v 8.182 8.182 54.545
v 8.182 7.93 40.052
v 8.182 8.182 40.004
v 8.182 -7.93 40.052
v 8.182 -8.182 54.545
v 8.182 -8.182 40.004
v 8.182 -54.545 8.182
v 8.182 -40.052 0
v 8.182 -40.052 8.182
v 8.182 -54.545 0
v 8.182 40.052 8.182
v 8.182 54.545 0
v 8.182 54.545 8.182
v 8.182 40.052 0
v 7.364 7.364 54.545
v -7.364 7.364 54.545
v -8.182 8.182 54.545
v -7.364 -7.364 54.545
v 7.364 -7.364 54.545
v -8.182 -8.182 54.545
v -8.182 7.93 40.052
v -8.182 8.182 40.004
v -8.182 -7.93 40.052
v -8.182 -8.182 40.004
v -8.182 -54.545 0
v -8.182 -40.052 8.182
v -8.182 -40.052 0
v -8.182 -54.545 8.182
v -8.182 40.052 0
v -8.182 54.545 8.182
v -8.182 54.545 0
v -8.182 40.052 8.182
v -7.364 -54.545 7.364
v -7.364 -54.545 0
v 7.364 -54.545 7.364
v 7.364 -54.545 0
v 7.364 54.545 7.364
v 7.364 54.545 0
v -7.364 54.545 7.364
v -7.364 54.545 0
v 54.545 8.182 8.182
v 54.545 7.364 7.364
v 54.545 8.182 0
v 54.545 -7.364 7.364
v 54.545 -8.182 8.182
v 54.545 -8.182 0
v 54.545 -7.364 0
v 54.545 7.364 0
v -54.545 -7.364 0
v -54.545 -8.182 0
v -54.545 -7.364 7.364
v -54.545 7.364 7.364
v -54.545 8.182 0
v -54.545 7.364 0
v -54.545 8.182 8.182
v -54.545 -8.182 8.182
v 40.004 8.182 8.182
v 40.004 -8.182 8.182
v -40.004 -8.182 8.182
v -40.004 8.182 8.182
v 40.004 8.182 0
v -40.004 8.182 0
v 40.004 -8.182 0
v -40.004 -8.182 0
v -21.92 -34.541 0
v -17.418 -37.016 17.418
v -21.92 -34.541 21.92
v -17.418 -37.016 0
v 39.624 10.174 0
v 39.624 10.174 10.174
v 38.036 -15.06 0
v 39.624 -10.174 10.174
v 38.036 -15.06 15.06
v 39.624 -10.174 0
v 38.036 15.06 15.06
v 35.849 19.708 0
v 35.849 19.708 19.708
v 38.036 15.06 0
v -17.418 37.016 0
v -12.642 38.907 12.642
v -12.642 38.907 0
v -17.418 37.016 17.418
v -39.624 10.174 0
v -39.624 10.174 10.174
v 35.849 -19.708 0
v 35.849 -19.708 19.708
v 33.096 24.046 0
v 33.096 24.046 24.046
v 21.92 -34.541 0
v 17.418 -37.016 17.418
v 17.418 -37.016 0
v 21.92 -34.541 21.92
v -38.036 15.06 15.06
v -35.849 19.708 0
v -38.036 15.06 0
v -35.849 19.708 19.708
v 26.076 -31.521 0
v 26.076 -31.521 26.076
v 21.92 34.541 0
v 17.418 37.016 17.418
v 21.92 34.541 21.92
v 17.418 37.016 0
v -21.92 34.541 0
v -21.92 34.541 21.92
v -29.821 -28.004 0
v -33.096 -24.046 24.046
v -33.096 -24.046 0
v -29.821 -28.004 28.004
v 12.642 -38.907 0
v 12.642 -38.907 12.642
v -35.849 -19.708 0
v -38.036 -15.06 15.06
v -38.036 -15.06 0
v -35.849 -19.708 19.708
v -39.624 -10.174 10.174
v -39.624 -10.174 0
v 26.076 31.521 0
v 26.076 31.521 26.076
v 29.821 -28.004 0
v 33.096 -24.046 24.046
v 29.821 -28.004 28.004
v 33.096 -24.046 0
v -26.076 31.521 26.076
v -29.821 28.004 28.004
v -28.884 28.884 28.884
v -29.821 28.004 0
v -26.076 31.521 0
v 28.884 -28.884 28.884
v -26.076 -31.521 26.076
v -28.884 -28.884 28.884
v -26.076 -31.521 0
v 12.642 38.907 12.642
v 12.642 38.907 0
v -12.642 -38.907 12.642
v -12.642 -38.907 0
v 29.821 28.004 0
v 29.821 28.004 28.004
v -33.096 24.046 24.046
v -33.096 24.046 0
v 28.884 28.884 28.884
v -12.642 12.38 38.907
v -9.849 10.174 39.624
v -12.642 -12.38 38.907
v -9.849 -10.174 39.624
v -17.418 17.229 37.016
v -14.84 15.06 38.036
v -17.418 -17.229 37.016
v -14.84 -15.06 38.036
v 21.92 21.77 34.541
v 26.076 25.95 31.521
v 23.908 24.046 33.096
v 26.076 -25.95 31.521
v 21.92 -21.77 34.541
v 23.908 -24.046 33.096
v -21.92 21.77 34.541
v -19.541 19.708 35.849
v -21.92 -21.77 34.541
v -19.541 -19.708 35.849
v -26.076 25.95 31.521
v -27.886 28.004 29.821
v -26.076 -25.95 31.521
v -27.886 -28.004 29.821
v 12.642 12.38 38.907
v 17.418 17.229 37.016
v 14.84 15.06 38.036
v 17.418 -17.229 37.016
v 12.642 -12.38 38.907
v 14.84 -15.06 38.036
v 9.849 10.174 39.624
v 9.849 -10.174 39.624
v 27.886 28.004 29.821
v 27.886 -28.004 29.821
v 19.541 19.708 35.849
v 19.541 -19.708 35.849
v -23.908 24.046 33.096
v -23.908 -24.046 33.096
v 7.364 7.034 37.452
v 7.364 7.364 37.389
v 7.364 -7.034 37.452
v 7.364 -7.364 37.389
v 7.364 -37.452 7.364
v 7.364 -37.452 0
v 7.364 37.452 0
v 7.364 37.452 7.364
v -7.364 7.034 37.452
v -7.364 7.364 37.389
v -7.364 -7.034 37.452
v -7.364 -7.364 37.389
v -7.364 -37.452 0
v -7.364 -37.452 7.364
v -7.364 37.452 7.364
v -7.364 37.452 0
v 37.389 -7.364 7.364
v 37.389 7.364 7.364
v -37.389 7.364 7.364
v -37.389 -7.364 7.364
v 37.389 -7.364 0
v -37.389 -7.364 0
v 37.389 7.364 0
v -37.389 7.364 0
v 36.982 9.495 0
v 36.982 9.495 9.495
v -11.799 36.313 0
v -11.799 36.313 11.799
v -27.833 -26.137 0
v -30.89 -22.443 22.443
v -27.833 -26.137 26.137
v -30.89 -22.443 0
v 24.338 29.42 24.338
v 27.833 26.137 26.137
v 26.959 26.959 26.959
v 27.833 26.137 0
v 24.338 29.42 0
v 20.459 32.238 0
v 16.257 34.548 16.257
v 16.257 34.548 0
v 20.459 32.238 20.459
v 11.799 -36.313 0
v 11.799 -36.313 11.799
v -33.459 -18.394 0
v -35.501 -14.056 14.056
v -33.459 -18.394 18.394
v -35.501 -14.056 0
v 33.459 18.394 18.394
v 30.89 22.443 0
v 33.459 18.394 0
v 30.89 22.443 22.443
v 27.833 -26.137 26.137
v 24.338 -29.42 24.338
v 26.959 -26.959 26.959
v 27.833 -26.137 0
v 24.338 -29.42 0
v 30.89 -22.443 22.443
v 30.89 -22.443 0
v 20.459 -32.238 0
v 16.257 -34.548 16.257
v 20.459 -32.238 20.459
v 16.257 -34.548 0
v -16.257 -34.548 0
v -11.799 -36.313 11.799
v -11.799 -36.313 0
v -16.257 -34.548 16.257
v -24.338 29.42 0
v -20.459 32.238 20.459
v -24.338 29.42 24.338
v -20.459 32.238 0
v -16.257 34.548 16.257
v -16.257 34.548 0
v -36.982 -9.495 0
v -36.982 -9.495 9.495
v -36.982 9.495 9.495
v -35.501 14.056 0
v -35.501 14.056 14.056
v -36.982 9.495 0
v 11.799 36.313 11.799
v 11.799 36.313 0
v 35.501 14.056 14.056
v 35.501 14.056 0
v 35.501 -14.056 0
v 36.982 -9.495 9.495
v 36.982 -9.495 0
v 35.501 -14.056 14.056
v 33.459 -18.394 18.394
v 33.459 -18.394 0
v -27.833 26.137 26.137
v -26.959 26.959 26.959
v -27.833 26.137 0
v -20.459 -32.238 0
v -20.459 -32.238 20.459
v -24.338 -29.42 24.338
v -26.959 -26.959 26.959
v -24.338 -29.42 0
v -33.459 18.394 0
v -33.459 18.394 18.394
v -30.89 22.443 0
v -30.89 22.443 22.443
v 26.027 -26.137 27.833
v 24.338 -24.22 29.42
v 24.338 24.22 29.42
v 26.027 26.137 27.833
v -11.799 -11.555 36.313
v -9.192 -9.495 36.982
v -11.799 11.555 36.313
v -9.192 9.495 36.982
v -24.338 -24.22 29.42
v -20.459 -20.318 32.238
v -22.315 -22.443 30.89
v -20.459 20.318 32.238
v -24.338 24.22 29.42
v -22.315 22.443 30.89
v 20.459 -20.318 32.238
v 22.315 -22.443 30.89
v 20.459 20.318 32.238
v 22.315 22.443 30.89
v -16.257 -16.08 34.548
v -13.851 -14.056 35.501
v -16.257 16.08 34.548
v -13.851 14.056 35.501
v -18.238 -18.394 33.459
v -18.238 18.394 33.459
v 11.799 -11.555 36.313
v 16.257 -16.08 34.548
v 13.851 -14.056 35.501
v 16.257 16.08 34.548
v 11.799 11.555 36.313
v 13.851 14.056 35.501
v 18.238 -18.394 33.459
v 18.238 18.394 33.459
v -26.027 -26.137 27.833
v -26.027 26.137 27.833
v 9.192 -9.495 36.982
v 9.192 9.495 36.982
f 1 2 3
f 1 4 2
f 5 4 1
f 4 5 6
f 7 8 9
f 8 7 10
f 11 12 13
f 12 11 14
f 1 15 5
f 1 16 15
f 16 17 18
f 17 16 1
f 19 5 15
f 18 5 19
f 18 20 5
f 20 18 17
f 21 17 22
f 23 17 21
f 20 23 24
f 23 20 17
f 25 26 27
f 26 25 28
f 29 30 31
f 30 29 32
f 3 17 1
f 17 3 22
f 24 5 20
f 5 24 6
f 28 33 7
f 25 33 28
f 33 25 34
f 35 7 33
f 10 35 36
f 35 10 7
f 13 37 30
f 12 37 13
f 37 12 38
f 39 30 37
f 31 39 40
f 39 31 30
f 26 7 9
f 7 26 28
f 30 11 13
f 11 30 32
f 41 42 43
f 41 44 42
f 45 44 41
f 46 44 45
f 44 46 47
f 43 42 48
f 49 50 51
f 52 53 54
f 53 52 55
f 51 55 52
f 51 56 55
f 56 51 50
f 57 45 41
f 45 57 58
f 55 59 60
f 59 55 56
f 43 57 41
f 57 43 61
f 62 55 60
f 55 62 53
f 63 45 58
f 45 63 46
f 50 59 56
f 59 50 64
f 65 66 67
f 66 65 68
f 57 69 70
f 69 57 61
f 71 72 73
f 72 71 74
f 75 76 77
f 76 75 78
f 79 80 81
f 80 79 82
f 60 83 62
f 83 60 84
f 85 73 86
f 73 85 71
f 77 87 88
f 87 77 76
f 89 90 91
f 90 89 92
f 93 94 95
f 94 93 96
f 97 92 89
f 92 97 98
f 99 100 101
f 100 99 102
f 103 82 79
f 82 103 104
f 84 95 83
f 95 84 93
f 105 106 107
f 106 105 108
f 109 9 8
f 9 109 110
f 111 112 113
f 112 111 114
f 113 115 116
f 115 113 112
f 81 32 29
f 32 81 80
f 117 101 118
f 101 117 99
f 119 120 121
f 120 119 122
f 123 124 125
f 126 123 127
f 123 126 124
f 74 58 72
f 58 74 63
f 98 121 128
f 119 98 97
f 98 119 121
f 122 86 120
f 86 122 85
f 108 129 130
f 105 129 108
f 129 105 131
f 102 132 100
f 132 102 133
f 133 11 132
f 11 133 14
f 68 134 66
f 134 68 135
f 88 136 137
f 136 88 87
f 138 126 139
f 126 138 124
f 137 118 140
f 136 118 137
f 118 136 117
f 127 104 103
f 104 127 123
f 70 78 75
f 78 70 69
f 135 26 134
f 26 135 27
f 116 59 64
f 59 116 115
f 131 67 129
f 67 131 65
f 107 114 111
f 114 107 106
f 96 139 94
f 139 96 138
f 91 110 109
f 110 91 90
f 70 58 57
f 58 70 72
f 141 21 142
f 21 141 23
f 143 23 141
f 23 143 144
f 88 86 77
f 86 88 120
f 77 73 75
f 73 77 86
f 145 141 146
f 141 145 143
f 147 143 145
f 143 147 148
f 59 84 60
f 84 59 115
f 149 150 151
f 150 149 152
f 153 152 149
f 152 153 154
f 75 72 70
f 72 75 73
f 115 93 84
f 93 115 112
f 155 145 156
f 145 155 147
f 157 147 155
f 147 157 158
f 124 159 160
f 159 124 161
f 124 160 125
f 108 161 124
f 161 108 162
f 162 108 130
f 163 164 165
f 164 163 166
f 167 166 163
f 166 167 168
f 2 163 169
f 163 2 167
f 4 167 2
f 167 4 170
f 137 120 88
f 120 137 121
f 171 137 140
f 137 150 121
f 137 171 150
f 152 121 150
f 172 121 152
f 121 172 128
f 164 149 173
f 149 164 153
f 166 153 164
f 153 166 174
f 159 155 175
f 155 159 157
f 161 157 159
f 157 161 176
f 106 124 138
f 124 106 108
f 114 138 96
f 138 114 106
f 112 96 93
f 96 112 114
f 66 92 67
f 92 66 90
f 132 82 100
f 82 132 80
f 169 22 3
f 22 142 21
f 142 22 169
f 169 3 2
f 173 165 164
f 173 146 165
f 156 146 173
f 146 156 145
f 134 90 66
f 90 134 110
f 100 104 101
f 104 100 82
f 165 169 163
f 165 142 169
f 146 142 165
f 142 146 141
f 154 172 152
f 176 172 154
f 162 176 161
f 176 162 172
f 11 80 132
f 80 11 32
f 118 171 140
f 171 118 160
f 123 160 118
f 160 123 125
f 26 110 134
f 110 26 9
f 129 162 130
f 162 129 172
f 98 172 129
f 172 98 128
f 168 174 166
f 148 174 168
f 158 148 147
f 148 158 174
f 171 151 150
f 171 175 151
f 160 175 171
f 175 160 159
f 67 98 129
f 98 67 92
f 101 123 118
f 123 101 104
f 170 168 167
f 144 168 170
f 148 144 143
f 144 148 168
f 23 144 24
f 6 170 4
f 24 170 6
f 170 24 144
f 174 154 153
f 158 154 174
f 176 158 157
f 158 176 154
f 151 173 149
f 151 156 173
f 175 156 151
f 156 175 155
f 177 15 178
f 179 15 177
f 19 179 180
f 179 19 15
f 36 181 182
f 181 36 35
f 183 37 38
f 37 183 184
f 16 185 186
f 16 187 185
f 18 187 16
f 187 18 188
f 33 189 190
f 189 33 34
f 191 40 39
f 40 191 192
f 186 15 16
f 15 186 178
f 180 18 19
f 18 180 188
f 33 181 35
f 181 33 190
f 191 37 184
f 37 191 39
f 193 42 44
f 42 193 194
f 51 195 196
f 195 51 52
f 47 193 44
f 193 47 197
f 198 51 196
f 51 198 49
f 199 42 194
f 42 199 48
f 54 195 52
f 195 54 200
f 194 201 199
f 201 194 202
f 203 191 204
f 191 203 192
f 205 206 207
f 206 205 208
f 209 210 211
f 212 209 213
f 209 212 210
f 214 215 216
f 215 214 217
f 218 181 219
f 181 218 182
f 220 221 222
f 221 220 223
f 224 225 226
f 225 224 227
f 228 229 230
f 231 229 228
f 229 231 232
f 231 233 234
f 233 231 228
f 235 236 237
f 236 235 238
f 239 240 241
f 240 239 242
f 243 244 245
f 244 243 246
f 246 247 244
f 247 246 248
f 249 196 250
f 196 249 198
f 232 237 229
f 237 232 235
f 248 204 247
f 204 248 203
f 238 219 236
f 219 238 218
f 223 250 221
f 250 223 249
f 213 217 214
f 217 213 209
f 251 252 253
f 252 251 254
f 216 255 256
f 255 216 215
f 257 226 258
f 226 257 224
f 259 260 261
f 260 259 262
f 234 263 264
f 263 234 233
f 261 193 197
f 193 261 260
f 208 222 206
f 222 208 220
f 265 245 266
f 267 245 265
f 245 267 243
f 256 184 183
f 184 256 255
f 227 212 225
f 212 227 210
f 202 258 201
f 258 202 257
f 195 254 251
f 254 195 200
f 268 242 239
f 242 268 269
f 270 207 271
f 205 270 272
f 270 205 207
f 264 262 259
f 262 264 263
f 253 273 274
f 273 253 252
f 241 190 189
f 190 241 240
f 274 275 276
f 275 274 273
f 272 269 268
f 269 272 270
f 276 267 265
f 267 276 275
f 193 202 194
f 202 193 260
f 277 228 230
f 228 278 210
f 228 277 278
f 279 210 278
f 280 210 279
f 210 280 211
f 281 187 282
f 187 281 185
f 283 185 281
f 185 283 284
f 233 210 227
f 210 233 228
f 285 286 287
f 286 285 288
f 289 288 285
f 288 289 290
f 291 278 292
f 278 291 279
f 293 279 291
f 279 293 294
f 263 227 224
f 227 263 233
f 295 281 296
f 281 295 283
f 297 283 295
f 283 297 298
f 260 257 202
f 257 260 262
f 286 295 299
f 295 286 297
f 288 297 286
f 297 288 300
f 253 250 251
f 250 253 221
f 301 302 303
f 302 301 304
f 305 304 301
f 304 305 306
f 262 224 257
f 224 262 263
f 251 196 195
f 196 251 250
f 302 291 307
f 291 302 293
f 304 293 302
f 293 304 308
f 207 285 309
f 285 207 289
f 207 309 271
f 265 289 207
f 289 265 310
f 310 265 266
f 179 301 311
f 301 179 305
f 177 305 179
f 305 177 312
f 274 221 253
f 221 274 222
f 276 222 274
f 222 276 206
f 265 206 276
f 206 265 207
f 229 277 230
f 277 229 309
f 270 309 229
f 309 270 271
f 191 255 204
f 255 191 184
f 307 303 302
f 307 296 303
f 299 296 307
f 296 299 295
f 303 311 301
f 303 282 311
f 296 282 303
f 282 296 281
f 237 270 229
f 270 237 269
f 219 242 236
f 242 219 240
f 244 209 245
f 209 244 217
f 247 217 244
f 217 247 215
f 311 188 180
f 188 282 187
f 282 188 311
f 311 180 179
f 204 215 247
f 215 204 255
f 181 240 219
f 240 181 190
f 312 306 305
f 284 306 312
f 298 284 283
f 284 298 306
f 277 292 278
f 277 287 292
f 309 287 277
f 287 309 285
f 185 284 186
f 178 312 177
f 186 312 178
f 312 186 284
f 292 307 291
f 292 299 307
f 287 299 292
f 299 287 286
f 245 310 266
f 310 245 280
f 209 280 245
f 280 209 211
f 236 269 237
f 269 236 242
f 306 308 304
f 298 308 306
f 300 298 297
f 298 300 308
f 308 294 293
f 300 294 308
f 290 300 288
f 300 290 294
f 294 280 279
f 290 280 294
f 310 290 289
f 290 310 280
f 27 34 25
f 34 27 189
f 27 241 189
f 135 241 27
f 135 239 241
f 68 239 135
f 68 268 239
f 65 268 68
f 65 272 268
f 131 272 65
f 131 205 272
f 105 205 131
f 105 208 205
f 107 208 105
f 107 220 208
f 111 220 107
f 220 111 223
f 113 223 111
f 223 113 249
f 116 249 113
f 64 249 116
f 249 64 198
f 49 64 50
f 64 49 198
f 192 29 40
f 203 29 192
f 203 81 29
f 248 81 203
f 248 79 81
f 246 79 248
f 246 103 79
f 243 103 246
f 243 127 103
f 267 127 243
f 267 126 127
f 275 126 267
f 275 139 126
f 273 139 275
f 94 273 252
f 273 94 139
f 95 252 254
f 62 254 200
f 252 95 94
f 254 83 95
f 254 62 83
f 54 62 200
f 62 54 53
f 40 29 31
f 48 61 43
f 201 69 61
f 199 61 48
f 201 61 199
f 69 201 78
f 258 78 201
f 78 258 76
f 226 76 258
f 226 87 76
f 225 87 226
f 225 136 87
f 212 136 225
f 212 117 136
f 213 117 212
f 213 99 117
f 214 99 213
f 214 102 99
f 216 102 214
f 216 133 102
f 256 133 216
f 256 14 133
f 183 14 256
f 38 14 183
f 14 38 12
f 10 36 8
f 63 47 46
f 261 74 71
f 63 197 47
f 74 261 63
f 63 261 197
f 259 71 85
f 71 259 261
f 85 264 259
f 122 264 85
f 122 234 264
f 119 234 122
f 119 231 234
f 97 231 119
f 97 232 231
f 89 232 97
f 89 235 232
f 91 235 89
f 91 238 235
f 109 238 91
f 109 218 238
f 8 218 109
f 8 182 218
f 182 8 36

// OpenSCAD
$fn=50;

scale_factor = 300/55;

CUBIE=18.9*scale_factor; //total side length of each cube piece (including rounded edges)
CORE=18*scale_factor;
SCREW_TIP=1.5*scale_factor;
SCREW_BODY=2*scale_factor;
SCREW_HEAD=3.8*scale_factor;
INNER=4.5*scale_factor;
SPRING=3.2*scale_factor;
ROUND=2*scale_factor; //radius of rounded edges
DEPTH=6*scale_factor;
RAFT=5*scale_factor;
LAYER=0.3*scale_factor;
GAP=0.25*scale_factor;

core_height = 20 * scale_factor;
core_radius = 3 * scale_factor;


WITH_SUPPORT=false;
WITH_RAFT=false;

inner_cubie=(CUBIE-2*ROUND); //length of each cube before rounded edges

tile_length = inner_cubie*0.75;
tile_height = 1 * scale_factor;

module tile(length, height) {
	translate([-length/2,-length/2,0]) {
		minkowski(){
			translate([0,0,-height/2]) cube([length,length,height]);
			cylinder(r=ROUND,h=height,center=true);
		}
	}
	
}


module cubie() {
    translate([-inner_cubie/2,-inner_cubie/2, -inner_cubie/2])
    minkowski() {
        cube([inner_cubie, inner_cubie, inner_cubie]);
        sphere(r=ROUND, $fn=10);
    }
}

module disc() {
    cylinder(CUBIE, r1=CORE, r2=CORE, $fn=50, center=true);

}

module disc2() {
    cylinder(CUBIE*10, r1=CORE, r2=CORE, $fn=50, center=true);

}

module icore() {
    disc();
    rotate([0,90,0])
        disc();
    rotate([90,0,0])
        disc();
}

module core2() {
    intersection() {
        disc2();
        rotate([0,90,0])
            disc2();
        rotate([90,0,0])
            disc2();
    }
}

module screw() {
    translate([5.2,0,0])
    rotate([0,90,0]) {
        cylinder(11.7,r1=SCREW_BODY,r2=SCREW_BODY,$fn=10,center=true);
        translate([0,0,-11.7/2-1.7/2])
            cylinder(1.7,r1=SCREW_HEAD,r2=SCREW_HEAD,$fn=10,center=true);
        translate([0,0,11.7/2+5.7/2])
            cylinder(5.7,r1=SCREW_TIP,r2=SCREW_TIP,$fn=10,center=true);
    }
}


module center() 
{
	difference() {
    	difference() 
	    {
	        union() 
	        {
	            difference() 
	            {
	                cubie();
	                translate([CUBIE,0,0])
	                    icore();
	
	            }
	            rotate([0,90,0])
	                cylinder(CUBIE,r1=INNER,r2=INNER,center=true);
	            if (WITH_RAFT)
	                raft();
	        }
	
	        rotate([0,90,0]) 
	        {
	            union() 
	            {
	                cylinder(CUBIE,r1=SCREW_BODY+GAP,r2=SCREW_BODY+GAP,$fn=10,center=true);
	
	                translate([0,0,CUBIE/2-1/2-3])
	                    cylinder(1.5,r1=SPRING+GAP,r2=SCREW_BODY+GAP,$fn=10,center=true);
	
	
	                translate([0,0,CUBIE/2-1/2-9.5])
	                    cylinder(1,r1=SCREW_HEAD+GAP,r2=SPRING+GAP,$fn=10,center=true);
	
	
	                translate([0,0,-4.25/2])
	                    cylinder(CUBIE-4.25,r1=SPRING+GAP,r2=SPRING+GAP,$fn=10,center=true);
	
	                translate([0,0,-10.5/2])
	                    cylinder(CUBIE-10.5,r1=SCREW_HEAD+GAP,r2=SCREW_HEAD+GAP,$fn=10,center=true); 
	            }
	        }
	    }
		translate([-CUBIE/2 + tile_height/2,0])
		rotate(v=[0,1,0], a=90)
		tile(tile_length*1.05, tile_height);		
	}
}

module edge() {
	difference() {
		difference() {
	    	union() {
		        difference() {
		            cubie();
		            translate([CUBIE,CUBIE,0])
		                icore();
		        }
		          
		
		       intersection() {
		            cube([CUBIE+(CUBIE-2*INNER),CUBIE+(CUBIE-2*INNER),2*INNER],center=true);
		            cube([50*scale_factor,50*scale_factor,2*INNER],center=true);
		            translate([CUBIE,CUBIE,0])
		            icore();
		   	}
			}
			translate([-CUBIE/2 + tile_height/2,0,0])
			rotate(v=[0,1,0],a=90)
			tile(tile_length*1.05,tile_height);
		}
		translate([0,-CUBIE/2 + tile_height/2,0])
		rotate(v=[1,0,0],a=90)
		tile(tile_length*1.05,tile_height);
	}
	
	if (WITH_RAFT)
	    raft();
   if (WITH_SUPPORT)
	    edge_support();
}

module corner() {
	difference() {
		difference() {
			difference() {
    			union() {
			        difference() {
			            cubie();
			        }
			 
			        intersection() {
			            cube([CUBIE+(CUBIE-2*INNER),CUBIE+(CUBIE-2*INNER),CUBIE+(CUBIE-2*INNER)],center=true);
			            translate([CUBIE,CUBIE,-CUBIE])
			                core2();
			        }
			   }
				translate([0,-CUBIE/2 + tile_height/2,0])
				rotate(v=[1,0,0],a=90)
				tile(tile_length*1.05,tile_height);
			}
			translate([-CUBIE/2 + tile_height/2,0,0])
			rotate(v=[0,1,0],a=90)
			tile(tile_length*1.05,tile_height);
		}
		translate([0,0,CUBIE/2 - tile_height/2])
		tile(tile_length*1.05,tile_height);
	}
			
	if (WITH_RAFT)
   raft();
   if (WITH_SUPPORT)
   corner_support();

}

module cylinder_sphere(height) {
	intersection() {
		cylinder(h=height, r=height/2, center=true);
		rotate(a=90, v=[1,0,0]) cylinder(h=height, r=height/2, center=true);
		rotate(a=90, v=[0,1,0]) cylinder(h=height, r=height/2, center=true);
	}
}

module core_shape_cylinders(height, radius) {
	cylinder(h=height,r=radius,center=true);
	rotate(a=90,v=[1,0,0]) cylinder(h=height,r=radius,center=true);
	rotate(a=90,v=[0,1,0]) cylinder(h=height,r=radius,center=true);
}

module core_shape(height, radius){
    cube([radius,radius,height],center=true);
	rotate(a=90,v=[1,0,0]) cube([radius,radius,height],center=true);
	rotate(a=90,v=[0,1,0]) cube([radius,radius,height],center=true);
}

module core_filled_in() {
	core_shape(core_height, core_radius);
	cylinder_sphere(core_height*0.75);
}


module core_hollow_part() {
	core_shape(core_height, core_radius*0.9);
	cylinder_sphere(core_height*0.7);
}

module core() {
	difference() {
		core_filled_in();
		core_hollow_part();
	}
}

/*
code to show the core and the inside of the core

difference() {
    core();
    cube([core_height/2,core_height/2,core_height/2]);
}*/

module core_half() {
    difference() {
        core();
        translate([0,0,-core_height/4])cube([core_height,core_height,core_height/2],center=true);
    }
}
!core_half();

module edge_support() {
    translate([0,-1.5/2+CUBIE-INNER,0])
        cube([CUBIE, 1.5, 2*INNER],center=true);

    translate([0,-1.5/2+CUBIE-INNER-2.5,0])
        cube([CUBIE, 1.5, 2*INNER],center=true);
}

module corner_support() {
    translate([0,-1.5/2+CUBIE-INNER,2*INNER-CUBIE])
        cube([CUBIE, 1.5, 2*INNER],center=true);
    rotate([-90,0,0])
        translate([0,-1.5/2+CUBIE-INNER,CUBIE-2*INNER])
            cube([CUBIE, 1.5, 2*INNER],center=true);
    translate([0,CUBIE/2+1.5,-CUBIE/2-1.5])
        cube([CUBIE, 1.5, 1.5],center=true);
}

module raft() {
    translate([-CUBIE/2+LAYER/2,0,0]) 
    rotate([0,90,0])
    minkowski() {
        cube([CUBIE, CUBIE, LAYER],center=true);
        cylinder(LAYER,r1=RAFT,r2=RAFT);
    }
}

module cut_through_center()
{
    intersection()
    {
        union()
        {
            center();
            screw();
        }

        translate([0,0,-CUBIE/2+LAYER/2])
            cube([100,0.1,100], center=true);
    }
}

translate([0,0,CUBIE/2])
rotate([0,-90,0])
edge(); 

translate([CUBIE+2*RAFT+2,0,CUBIE/2])
rotate([0,-90,0])
corner();

translate([2*CUBIE+4*RAFT+4,0,CUBIE/2])
rotate([0,-90,0])
center();

translate([470,0,core_height/2])
core();

translate([200,-150,0])
tile(tile_length,tile_height);
